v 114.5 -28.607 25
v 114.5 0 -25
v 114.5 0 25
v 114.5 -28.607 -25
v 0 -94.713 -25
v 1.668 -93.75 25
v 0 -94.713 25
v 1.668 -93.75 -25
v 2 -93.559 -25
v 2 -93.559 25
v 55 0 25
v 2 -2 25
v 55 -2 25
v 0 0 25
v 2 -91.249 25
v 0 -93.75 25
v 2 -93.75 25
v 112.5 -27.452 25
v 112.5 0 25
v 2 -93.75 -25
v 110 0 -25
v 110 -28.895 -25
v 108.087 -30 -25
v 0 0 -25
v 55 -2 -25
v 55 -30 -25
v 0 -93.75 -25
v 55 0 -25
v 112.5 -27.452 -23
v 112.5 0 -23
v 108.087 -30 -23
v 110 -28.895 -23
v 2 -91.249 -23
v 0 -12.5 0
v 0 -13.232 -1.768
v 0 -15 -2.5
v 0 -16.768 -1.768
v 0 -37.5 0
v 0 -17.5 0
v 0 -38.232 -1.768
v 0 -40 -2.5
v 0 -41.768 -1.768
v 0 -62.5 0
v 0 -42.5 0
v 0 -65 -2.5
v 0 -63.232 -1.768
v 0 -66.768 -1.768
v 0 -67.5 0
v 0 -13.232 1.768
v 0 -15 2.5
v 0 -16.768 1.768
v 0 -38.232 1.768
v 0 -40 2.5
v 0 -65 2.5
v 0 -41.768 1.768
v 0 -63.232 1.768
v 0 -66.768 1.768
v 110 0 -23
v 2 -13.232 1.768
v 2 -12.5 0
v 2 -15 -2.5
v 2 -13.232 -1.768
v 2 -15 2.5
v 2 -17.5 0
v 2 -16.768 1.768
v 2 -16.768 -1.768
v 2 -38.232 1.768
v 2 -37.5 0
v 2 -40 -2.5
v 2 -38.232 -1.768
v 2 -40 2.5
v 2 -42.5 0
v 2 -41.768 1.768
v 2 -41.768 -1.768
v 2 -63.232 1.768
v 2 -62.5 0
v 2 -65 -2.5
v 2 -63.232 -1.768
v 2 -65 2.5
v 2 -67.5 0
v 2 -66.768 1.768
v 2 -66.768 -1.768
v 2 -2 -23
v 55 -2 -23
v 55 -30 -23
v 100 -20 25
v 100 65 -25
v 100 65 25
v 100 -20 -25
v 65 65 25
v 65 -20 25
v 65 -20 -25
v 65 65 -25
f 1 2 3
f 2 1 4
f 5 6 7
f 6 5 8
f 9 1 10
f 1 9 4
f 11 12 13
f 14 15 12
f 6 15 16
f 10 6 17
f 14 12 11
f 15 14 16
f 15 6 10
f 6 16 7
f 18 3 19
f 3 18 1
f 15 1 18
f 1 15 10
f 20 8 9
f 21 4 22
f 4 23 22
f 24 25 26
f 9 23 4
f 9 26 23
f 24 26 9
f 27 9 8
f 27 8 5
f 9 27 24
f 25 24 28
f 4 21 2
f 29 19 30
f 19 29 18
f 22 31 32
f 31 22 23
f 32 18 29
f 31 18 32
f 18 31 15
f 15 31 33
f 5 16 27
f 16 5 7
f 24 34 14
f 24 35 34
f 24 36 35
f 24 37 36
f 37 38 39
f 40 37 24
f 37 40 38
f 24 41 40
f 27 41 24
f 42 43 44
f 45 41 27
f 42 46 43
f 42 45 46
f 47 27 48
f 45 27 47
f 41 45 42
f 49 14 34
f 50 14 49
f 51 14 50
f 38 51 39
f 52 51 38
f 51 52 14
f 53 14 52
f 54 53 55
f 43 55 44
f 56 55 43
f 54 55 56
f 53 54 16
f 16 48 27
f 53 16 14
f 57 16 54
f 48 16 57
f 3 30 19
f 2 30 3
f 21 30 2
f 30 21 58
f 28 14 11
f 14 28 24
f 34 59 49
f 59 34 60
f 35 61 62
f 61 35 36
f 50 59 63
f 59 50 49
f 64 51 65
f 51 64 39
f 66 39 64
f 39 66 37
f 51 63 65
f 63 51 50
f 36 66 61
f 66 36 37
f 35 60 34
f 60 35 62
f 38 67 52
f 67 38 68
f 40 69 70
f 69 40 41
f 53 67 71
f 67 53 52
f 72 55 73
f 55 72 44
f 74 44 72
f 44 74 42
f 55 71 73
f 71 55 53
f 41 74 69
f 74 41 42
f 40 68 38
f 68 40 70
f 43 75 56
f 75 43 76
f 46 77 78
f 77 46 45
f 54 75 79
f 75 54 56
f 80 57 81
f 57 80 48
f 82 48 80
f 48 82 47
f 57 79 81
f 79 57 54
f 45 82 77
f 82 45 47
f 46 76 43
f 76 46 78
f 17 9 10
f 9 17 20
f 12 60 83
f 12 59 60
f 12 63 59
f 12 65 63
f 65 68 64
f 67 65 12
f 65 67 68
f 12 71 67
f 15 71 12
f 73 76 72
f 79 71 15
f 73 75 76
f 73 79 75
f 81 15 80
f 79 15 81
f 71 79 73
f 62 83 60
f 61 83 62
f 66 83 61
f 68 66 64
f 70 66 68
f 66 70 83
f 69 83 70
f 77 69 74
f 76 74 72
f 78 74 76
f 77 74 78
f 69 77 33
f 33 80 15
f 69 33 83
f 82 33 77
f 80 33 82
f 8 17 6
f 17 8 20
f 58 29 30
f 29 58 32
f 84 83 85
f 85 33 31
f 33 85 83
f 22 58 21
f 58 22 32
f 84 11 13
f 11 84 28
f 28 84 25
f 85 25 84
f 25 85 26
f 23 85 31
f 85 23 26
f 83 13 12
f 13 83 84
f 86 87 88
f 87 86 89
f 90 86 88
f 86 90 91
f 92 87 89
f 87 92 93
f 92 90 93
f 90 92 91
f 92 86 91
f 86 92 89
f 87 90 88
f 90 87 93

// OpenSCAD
d = 100;
th = 2;


outer = 225;
h = 50;
// 95 betw holes    22outside wheels
// h = 30    130 betw wheels 200 right outside

module hexagon(d, h) {
    difference() {
        cylinder(d=2*d, h=h, center=true);
        for (i = [0:5]) rotate([0,0,i*60]) translate([500+d/2,0,0]) cube([1000,1000,1000], center=true);
    }
}

translate([0,outer/6,0]) difference() {
    hexagon(d=outer+2*th, h=h);
    hexagon(d=outer, h=h);
    translate([-500,0,0]) cube([1000,1000,1000], center=true);
    translate([0,500-outer/6,0]) cube([1000,1000,1000], center=true);
}
difference() {
    translate([th/2,0,0]) cube([th,outer*5/6,h], center=true);
    translate([0,500,0]) cube([1000,1000,1000], center=true);
    for (i = [15,40,65]) translate([0,-i,0]) rotate([0,90,0]) cylinder(d=5,h=10*th, center=true);
}
translate([(130-20)/2/2, -th/2,0]) cube([(130-20)/2, th, h], center=true);

difference () {
    translate([0,outer/6,0]) intersection() {
        hexagon(d=outer+2*th, h=2*h);
        translate([0,0,-h/2+th/2]) cube([1000,1000,th], center=true);
    }
    translate([-500,0,0]) cube([1000,1000,1000], center=true);
    translate([0,500,0]) cube([1000,1000,1000], center=true);
    translate([100-35/2,-30/2,0]) cube([35+20, 20+10,1000], center=true);
}

//translate([0,th/2,0]) cube([200,th,h], center=true);
translate([100-35/2,-20/2,0]) cube([35, 20,h], center=true);
translate([100-35/2,65/2,0]) cube([35, 65,h], center=true);
